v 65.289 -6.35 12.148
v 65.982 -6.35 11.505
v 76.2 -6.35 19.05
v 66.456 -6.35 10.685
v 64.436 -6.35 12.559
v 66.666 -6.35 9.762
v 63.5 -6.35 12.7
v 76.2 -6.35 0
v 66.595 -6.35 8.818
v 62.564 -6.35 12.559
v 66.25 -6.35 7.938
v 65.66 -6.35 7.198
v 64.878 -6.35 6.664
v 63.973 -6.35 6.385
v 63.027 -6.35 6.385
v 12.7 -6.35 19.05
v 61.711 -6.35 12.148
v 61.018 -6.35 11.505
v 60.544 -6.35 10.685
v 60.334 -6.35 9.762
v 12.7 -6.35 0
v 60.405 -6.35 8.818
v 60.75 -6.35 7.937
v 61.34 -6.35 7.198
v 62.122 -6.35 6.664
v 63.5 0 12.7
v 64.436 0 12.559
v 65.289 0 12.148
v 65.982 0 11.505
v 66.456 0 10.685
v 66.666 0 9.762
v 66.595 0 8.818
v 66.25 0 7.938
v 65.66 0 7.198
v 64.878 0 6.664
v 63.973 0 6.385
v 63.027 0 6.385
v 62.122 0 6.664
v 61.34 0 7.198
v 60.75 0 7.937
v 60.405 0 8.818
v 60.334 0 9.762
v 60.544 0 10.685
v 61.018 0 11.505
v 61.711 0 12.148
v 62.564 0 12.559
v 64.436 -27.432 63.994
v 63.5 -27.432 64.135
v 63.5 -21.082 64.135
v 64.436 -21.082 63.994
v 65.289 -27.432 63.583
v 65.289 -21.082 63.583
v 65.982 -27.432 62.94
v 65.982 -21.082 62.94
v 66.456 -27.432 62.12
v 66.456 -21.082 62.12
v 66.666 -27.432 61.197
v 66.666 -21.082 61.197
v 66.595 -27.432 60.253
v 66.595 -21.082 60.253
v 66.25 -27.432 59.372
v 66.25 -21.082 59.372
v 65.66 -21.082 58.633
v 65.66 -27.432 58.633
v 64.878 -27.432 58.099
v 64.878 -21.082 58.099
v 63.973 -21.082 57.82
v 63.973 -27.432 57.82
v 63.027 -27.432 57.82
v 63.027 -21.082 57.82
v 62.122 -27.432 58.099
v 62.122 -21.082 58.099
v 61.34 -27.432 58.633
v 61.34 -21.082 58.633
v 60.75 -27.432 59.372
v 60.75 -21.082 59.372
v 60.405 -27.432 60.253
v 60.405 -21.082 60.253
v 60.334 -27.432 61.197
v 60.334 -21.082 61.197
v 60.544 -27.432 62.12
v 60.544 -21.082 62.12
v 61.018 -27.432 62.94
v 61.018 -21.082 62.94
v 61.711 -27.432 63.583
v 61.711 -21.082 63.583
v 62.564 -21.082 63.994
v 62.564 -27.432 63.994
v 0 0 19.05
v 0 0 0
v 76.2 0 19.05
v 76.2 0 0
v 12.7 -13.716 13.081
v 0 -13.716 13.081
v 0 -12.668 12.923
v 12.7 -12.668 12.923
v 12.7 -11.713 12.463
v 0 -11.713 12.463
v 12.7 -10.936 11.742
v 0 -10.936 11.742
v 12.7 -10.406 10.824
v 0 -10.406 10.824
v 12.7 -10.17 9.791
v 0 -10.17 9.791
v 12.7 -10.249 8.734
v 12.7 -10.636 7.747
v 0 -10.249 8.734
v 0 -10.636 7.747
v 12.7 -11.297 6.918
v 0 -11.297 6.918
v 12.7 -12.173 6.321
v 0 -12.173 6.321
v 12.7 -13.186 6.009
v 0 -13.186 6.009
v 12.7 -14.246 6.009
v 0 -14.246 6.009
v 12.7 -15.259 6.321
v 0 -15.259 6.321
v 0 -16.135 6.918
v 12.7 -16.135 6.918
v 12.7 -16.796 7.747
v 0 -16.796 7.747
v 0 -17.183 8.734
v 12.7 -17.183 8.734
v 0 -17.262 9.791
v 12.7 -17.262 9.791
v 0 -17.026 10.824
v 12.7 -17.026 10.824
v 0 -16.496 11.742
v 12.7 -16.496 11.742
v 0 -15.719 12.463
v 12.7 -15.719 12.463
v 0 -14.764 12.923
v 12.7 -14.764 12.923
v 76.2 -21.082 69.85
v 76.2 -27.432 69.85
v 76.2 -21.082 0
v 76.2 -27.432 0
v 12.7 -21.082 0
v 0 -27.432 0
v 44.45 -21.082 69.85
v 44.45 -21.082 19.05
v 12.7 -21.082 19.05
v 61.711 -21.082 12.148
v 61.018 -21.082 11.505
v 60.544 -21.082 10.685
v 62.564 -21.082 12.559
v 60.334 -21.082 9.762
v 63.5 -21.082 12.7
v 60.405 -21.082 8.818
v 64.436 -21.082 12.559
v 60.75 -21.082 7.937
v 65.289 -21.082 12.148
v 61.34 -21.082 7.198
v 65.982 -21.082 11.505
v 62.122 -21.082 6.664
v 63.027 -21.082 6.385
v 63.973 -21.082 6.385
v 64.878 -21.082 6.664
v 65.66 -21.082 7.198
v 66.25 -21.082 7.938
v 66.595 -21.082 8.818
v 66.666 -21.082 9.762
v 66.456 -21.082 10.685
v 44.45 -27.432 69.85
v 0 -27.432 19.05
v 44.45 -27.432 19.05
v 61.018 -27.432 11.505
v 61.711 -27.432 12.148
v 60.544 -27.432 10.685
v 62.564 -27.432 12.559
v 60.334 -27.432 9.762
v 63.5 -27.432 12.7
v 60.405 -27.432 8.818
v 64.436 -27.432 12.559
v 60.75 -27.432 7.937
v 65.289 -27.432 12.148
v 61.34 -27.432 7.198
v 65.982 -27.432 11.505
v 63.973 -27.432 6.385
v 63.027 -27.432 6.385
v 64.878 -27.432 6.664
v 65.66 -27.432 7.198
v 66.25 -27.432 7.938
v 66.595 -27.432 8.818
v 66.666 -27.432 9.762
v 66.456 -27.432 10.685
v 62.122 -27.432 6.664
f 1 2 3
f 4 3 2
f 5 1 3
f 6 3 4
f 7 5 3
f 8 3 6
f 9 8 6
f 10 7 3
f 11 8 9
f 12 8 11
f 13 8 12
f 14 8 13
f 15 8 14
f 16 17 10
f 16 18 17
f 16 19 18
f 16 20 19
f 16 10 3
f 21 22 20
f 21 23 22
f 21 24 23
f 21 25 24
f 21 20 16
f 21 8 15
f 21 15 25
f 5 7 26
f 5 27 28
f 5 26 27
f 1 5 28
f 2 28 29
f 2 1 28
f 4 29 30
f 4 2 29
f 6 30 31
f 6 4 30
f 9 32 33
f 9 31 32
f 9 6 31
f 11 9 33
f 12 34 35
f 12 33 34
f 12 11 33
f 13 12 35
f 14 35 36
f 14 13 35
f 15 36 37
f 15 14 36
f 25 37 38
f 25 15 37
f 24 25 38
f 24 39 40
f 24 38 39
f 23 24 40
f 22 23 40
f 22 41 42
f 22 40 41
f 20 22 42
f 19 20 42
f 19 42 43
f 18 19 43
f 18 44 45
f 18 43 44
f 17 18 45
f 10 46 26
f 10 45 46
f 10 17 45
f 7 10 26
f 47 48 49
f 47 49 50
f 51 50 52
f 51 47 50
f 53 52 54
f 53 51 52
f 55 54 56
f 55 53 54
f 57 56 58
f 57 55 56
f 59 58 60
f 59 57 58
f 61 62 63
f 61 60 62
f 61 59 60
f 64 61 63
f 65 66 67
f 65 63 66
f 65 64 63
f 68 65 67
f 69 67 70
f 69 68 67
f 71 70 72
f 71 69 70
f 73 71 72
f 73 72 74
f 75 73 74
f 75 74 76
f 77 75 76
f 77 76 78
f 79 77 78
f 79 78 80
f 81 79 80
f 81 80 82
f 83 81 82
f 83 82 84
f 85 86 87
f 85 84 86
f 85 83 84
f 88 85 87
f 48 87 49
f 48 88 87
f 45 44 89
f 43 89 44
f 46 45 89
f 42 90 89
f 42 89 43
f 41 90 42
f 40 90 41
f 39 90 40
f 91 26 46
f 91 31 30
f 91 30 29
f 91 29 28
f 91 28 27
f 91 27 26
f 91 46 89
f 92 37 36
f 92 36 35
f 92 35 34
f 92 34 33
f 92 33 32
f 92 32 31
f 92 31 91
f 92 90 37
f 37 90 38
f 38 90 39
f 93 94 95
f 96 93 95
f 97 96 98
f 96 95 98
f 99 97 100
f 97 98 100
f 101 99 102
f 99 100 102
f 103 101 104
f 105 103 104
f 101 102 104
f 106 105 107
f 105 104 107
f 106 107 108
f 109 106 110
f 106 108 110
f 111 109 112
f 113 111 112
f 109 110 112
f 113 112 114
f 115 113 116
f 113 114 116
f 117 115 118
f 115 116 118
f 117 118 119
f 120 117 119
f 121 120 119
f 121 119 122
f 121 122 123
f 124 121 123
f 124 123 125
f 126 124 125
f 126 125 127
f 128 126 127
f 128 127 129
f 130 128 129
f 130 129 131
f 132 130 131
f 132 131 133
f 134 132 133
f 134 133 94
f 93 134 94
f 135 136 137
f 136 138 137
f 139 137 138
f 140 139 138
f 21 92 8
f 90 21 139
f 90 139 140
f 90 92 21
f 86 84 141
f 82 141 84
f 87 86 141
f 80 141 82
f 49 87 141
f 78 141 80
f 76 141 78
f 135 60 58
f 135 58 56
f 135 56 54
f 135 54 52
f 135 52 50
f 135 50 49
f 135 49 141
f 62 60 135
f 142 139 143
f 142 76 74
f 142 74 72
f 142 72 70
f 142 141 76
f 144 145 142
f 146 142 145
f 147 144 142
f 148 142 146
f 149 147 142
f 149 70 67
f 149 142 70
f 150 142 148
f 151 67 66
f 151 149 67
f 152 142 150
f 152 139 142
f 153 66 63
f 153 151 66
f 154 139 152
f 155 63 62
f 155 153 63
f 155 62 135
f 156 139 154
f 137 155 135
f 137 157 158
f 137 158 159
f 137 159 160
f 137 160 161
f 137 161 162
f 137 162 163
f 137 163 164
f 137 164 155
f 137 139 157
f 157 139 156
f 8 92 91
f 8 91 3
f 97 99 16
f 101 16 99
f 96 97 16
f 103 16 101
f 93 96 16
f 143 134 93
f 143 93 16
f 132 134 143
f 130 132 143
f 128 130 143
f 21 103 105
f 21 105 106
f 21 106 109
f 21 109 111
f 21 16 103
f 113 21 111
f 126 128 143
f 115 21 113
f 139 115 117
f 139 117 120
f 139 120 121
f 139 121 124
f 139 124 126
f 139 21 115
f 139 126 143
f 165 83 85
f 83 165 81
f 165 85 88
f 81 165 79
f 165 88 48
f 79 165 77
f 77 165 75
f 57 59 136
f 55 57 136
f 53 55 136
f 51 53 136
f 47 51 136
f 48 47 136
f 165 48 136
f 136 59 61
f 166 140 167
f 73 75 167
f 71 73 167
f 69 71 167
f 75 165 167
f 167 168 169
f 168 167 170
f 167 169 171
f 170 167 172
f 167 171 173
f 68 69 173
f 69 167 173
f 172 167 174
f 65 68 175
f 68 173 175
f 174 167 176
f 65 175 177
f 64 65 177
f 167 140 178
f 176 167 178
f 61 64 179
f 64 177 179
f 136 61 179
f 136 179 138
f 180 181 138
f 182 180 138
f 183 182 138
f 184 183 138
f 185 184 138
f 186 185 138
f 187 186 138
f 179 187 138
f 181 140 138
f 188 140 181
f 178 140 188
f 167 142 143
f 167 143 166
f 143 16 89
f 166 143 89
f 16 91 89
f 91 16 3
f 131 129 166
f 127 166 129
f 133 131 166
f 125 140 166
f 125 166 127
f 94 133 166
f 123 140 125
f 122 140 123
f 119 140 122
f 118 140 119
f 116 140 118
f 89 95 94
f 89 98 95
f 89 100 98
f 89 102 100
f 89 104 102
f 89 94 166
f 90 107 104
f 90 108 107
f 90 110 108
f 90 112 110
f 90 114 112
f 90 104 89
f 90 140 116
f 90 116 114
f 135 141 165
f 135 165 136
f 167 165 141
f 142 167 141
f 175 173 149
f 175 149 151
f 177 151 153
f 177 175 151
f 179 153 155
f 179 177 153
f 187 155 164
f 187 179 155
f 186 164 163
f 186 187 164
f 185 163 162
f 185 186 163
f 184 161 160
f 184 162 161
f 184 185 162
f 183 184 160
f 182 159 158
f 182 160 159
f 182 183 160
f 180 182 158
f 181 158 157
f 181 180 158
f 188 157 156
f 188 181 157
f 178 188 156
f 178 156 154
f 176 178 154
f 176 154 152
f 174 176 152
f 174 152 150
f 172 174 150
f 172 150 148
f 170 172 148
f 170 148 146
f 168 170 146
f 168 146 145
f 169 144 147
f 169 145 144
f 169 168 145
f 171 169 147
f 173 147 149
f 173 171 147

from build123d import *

# Parameters (mm, degrees)
BOSS_EXTRUDE1_DEPTH     = 19.05
SKETCH2_W               = 31.75
SKETCH2_H               = 6.35
BOSS_EXTRUDE2_DEPTH     = 50.8
CUT_EXTRUDE1_DEPTH      = 106.498403893
CUT_EXTRUDE1_DEPTH_BACK = 106.498403893
SKETCH3_R               = 3.175
SKETCH4_R               = 3.556
CUT_EXTRUDE2_DEPTH      = 50.8


with BuildPart() as part:
    # Sketch1 → Boss-Extrude1 (new body)
    with BuildSketch(Plane.XY):
        Polygon((0, 0), (76.2, 0), (76.2, -6.35), (12.7, -6.35), (12.7, -21.082), (76.2, -21.082), (76.2, -27.432), (0, -27.432), align=None)
    extrude(amount=BOSS_EXTRUDE1_DEPTH)

    # Sketch2 → Boss-Extrude2 (add)
    with BuildSketch(Plane.XY.offset(19.05)):
        with Locations((60.325, -24.257)):
            Rectangle(SKETCH2_W, SKETCH2_H)
    extrude(amount=BOSS_EXTRUDE2_DEPTH)

    # Sketch3 → Cut-Extrude1 (cut, two sides: drawn at the far end of the back side and taken through both)
    with BuildSketch(Plane(origin=(0, -21.082, 0), x_dir=(1, 0, 0), z_dir=(0, 1, 0)).offset(-CUT_EXTRUDE1_DEPTH_BACK)):
        with Locations(Location((63.5, -60.96, 0), (0, 0, 270))):
            Circle(SKETCH3_R)
        with Locations(Location((63.5, -9.525, 0), (0, 0, 270))):
            Circle(SKETCH3_R)
    extrude(amount=CUT_EXTRUDE1_DEPTH + CUT_EXTRUDE1_DEPTH_BACK, mode=Mode.SUBTRACT)

    # Sketch4 → Cut-Extrude2 (cut)
    with BuildSketch(Plane.ZY):
        with Locations((9.525, -13.716)):
            Circle(SKETCH4_R)
    extrude(amount=-CUT_EXTRUDE2_DEPTH, mode=Mode.SUBTRACT)


solid = part.part
